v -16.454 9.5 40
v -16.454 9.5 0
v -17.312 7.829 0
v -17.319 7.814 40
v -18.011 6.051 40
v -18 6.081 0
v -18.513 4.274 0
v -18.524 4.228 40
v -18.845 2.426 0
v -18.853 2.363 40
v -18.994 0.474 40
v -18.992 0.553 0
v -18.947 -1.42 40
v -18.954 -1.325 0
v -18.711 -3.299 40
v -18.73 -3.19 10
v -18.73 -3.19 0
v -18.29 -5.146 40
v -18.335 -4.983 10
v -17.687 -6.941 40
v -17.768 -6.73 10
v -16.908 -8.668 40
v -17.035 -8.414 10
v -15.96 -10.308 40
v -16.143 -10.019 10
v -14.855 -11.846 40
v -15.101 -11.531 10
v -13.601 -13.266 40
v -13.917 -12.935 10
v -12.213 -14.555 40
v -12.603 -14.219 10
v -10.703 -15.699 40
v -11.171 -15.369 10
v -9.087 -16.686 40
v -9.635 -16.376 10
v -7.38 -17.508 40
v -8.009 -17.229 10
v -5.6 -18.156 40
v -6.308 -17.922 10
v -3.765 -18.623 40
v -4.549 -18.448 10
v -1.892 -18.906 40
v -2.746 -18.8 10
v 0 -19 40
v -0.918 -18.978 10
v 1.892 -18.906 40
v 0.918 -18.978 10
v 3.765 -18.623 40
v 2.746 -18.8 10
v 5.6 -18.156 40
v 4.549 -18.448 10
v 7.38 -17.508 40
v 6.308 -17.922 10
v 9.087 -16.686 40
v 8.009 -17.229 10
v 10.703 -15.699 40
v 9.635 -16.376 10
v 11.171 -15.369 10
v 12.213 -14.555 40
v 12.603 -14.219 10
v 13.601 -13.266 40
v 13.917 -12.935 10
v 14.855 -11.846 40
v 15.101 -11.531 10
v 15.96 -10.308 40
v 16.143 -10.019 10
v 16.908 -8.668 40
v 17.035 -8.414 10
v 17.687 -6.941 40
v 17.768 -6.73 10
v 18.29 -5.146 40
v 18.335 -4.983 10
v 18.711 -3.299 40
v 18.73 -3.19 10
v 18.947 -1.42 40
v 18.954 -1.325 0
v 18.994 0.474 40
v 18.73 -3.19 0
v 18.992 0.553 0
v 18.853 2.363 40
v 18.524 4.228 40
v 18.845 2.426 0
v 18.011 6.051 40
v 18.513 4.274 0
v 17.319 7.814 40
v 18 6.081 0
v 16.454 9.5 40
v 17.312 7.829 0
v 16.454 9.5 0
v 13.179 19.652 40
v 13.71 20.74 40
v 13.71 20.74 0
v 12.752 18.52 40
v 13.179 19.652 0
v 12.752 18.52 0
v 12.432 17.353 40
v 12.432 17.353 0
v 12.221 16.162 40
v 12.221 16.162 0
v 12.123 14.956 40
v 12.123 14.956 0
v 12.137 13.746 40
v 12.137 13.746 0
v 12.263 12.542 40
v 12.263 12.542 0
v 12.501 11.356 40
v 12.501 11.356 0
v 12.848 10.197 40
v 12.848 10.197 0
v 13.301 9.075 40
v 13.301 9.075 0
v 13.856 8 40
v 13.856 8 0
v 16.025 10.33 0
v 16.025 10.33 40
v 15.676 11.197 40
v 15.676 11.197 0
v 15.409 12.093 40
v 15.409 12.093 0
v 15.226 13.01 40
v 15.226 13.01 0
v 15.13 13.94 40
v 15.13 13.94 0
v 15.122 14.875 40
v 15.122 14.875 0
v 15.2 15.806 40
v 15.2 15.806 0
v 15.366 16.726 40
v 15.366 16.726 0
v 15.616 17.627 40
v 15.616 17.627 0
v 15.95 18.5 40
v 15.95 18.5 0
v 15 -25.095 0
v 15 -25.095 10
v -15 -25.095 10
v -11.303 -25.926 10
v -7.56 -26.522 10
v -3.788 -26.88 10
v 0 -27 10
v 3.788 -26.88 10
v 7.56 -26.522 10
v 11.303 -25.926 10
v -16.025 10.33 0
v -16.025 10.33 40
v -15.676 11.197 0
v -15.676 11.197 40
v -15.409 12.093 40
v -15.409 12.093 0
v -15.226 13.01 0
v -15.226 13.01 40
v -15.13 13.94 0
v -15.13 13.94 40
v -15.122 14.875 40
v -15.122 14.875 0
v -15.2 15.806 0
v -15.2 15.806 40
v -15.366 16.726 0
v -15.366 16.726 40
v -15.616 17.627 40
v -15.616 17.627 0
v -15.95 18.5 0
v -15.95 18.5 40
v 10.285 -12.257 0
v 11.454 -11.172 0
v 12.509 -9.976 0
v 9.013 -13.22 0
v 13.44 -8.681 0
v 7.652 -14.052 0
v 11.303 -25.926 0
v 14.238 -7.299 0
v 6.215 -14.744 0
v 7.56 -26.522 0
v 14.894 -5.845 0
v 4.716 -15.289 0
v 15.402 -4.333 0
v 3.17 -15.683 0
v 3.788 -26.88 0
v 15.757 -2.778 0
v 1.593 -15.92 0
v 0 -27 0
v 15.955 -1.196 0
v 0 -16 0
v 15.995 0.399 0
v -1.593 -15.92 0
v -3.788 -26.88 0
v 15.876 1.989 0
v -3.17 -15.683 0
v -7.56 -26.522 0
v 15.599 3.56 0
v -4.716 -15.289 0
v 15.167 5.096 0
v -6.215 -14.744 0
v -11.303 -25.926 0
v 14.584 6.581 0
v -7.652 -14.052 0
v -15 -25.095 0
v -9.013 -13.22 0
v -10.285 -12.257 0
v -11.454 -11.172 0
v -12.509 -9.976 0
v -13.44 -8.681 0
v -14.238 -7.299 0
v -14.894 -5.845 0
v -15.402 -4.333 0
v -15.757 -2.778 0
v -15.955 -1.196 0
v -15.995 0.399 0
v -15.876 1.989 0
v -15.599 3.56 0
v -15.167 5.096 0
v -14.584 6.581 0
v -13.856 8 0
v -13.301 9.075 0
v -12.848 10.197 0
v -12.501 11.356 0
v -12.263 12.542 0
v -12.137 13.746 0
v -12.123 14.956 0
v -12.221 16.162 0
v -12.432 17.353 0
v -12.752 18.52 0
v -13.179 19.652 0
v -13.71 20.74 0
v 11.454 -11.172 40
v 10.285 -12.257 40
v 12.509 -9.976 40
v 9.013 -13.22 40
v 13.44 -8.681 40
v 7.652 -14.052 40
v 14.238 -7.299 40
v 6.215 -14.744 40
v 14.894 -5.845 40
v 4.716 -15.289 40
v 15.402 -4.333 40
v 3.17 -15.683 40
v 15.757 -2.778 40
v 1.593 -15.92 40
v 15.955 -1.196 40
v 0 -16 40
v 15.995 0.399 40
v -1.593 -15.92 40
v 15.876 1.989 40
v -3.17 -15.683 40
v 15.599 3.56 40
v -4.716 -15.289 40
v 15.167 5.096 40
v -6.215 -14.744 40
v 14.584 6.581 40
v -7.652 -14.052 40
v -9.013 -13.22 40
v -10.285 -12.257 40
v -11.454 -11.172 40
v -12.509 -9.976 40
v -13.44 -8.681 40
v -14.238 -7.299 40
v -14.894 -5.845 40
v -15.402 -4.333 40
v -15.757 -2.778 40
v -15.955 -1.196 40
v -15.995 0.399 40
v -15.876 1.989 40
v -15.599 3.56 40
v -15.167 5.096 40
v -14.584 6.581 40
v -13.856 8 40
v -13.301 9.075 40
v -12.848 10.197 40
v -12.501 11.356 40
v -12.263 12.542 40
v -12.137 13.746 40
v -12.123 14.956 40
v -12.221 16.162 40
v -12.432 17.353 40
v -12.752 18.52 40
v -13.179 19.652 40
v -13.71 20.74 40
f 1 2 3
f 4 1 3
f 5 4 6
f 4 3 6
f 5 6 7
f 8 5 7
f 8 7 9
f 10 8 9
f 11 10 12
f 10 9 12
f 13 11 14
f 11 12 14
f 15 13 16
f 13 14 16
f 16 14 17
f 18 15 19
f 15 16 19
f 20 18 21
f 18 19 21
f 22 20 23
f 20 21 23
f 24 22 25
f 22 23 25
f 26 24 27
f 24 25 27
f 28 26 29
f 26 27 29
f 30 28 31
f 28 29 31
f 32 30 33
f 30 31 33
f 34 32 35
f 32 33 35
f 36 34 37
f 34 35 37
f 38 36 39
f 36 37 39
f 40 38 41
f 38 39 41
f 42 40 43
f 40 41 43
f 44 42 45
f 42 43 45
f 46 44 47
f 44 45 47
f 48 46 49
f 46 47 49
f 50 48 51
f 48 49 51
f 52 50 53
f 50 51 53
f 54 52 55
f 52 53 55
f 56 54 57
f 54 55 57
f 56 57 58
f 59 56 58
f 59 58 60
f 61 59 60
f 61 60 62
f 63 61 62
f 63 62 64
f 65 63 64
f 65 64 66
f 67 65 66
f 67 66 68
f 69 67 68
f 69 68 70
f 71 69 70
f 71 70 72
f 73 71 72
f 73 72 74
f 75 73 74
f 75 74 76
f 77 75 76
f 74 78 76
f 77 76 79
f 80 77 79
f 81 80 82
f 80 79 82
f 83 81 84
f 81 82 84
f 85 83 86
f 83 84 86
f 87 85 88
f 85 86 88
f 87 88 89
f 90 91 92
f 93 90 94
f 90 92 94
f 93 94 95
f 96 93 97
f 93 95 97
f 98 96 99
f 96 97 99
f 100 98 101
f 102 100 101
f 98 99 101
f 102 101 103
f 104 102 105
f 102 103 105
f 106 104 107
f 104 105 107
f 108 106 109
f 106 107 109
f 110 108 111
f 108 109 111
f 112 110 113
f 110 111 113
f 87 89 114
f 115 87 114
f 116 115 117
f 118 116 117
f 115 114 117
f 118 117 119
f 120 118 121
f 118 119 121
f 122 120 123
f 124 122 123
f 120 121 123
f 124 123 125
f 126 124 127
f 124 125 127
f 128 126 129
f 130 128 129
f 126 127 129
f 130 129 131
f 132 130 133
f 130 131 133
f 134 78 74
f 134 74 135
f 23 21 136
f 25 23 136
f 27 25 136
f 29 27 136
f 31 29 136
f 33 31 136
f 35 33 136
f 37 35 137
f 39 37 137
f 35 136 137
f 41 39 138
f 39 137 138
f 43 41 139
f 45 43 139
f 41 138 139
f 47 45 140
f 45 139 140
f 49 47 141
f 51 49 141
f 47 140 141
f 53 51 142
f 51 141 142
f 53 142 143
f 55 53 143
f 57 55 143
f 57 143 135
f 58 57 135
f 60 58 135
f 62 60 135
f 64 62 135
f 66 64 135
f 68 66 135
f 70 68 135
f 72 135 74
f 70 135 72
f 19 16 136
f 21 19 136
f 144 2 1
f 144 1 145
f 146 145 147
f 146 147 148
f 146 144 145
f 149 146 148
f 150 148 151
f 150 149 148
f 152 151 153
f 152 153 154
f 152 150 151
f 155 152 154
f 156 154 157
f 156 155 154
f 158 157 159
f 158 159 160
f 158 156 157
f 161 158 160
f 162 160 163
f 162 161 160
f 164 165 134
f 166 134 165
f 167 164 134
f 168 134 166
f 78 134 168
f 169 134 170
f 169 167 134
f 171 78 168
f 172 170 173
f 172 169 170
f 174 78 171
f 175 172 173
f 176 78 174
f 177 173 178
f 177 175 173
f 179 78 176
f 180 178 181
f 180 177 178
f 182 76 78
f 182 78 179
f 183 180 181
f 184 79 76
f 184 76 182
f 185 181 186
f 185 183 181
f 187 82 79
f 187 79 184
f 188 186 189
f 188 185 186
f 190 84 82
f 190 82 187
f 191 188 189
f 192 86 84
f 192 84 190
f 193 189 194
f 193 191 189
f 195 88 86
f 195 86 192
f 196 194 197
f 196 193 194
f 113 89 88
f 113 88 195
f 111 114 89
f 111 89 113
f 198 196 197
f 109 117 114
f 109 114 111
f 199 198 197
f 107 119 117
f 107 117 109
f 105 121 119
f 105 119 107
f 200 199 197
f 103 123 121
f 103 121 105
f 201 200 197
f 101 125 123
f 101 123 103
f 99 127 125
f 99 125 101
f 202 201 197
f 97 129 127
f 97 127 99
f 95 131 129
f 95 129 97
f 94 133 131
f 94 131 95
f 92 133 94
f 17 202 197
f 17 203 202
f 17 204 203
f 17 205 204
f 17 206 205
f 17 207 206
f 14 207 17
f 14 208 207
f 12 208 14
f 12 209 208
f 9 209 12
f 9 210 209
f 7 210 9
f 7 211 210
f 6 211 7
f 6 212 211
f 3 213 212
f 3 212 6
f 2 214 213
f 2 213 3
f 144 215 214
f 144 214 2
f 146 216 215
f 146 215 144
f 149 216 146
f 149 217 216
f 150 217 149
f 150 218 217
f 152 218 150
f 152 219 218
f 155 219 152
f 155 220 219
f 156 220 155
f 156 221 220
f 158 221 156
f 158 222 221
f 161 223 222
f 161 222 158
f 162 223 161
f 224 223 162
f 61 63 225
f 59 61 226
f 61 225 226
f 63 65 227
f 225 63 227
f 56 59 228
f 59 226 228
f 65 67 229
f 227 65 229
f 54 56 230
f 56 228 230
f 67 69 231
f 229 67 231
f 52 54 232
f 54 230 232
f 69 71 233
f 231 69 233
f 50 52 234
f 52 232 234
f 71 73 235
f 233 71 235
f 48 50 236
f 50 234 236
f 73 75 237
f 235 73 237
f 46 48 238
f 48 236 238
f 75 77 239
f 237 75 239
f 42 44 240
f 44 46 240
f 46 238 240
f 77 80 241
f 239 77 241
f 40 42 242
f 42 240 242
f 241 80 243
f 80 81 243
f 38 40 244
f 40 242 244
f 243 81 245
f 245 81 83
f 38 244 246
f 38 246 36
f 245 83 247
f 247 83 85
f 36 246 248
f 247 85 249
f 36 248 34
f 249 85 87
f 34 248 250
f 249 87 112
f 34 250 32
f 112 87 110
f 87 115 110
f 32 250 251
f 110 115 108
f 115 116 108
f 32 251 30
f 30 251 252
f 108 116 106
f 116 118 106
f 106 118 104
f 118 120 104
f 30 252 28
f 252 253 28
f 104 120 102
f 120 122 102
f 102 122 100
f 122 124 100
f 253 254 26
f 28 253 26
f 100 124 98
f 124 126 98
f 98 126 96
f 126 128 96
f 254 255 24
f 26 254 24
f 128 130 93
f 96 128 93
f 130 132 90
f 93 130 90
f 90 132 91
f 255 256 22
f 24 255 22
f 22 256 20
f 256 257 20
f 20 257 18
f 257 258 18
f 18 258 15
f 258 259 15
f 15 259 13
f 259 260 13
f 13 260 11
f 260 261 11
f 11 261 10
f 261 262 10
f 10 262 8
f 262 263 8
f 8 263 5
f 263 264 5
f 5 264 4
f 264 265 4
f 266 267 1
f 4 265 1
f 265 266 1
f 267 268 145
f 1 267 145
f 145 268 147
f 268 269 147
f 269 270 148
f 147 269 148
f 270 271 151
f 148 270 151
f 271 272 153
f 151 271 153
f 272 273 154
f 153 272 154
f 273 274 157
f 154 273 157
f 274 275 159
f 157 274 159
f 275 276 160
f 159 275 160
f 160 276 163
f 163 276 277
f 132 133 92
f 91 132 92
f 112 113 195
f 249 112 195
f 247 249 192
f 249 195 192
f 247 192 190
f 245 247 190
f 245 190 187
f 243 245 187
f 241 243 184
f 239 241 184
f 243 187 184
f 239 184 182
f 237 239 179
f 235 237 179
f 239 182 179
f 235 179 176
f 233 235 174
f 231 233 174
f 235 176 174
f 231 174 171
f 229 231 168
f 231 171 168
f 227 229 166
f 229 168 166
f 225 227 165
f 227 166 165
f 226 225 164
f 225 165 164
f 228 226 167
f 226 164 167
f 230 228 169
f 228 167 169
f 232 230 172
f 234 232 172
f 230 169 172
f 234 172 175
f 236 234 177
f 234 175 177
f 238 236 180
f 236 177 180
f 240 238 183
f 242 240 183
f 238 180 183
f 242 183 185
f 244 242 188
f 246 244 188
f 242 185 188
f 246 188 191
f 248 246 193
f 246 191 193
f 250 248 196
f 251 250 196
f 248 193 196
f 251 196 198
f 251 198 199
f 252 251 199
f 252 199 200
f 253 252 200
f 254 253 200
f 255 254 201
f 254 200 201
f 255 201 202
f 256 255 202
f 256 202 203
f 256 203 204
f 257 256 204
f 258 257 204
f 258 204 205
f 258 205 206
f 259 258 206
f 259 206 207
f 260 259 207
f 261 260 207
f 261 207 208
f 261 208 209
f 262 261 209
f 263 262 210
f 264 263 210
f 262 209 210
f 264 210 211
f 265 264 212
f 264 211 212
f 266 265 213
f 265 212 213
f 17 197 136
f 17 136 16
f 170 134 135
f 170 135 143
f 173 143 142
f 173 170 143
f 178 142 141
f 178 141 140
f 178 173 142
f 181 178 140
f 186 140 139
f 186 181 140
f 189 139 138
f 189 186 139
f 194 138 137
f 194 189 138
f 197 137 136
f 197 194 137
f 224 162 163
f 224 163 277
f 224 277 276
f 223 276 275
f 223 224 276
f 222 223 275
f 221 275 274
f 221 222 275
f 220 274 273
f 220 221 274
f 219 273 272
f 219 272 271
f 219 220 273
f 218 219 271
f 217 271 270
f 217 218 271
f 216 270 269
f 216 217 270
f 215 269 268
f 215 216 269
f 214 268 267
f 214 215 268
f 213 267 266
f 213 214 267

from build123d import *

# Parameters (mm, degrees)
F1_DEPTH = 40
F3_DEPTH = 40
F6_DEPTH = 10


with BuildPart() as f1:
    # F0 (on Top) → F1 (new body)
    with BuildSketch(Plane.XY):
        with BuildLine():
            ThreePointArc((13.856406, 8), (0, -16), (-13.856406, 8))
            Line((-13.856406, 8), (-15.545047, 10.924812))
            ThreePointArc((-15.545047, 10.924812), (0, -19), (15.545047, 10.924812))
            Line((15.545047, 10.924812), (13.856406, 8))
        make_face()
    extrude(amount=F1_DEPTH)

    # F2 (on Top) → F3 (join, through all)
    with BuildSketch(Plane.XY):
        with BuildLine():
            Line((15.949585, 18.5), (13.710013, 20.739573))
            ThreePointArc((13.710013, 20.739573), (12.115595, 14.350623), (13.856406, 8))
            Line((13.856406, 8), (16.454483, 9.5))
            ThreePointArc((16.454483, 9.5), (15.130436, 13.939884), (15.949585, 18.5))
        make_face()
    extrude(amount=F3_DEPTH)

    # F4: F1 across plane


with BuildPart() as f1_1:
    add(f1.part)
    add(f1.part.mirror(Plane.YZ))

    # F5 (on face) → F6 (join)
    with BuildSketch(Plane(origin=(0, 0, 0), x_dir=(1, 0, 0), z_dir=(0, 0, -1))):
        with BuildLine():
            ThreePointArc((-18.730344, 3.189705), (0, 19), (18.730344, 3.189705))
            Line((18.730344, 3.189705), (15, 25.09475))
            ThreePointArc((15, 25.09475), (0, 27), (-15, 25.09475))
            Line((-15, 25.09475), (-18.730344, 3.189705))
        make_face()
    extrude(amount=-F6_DEPTH)


solid = f1_1.part
